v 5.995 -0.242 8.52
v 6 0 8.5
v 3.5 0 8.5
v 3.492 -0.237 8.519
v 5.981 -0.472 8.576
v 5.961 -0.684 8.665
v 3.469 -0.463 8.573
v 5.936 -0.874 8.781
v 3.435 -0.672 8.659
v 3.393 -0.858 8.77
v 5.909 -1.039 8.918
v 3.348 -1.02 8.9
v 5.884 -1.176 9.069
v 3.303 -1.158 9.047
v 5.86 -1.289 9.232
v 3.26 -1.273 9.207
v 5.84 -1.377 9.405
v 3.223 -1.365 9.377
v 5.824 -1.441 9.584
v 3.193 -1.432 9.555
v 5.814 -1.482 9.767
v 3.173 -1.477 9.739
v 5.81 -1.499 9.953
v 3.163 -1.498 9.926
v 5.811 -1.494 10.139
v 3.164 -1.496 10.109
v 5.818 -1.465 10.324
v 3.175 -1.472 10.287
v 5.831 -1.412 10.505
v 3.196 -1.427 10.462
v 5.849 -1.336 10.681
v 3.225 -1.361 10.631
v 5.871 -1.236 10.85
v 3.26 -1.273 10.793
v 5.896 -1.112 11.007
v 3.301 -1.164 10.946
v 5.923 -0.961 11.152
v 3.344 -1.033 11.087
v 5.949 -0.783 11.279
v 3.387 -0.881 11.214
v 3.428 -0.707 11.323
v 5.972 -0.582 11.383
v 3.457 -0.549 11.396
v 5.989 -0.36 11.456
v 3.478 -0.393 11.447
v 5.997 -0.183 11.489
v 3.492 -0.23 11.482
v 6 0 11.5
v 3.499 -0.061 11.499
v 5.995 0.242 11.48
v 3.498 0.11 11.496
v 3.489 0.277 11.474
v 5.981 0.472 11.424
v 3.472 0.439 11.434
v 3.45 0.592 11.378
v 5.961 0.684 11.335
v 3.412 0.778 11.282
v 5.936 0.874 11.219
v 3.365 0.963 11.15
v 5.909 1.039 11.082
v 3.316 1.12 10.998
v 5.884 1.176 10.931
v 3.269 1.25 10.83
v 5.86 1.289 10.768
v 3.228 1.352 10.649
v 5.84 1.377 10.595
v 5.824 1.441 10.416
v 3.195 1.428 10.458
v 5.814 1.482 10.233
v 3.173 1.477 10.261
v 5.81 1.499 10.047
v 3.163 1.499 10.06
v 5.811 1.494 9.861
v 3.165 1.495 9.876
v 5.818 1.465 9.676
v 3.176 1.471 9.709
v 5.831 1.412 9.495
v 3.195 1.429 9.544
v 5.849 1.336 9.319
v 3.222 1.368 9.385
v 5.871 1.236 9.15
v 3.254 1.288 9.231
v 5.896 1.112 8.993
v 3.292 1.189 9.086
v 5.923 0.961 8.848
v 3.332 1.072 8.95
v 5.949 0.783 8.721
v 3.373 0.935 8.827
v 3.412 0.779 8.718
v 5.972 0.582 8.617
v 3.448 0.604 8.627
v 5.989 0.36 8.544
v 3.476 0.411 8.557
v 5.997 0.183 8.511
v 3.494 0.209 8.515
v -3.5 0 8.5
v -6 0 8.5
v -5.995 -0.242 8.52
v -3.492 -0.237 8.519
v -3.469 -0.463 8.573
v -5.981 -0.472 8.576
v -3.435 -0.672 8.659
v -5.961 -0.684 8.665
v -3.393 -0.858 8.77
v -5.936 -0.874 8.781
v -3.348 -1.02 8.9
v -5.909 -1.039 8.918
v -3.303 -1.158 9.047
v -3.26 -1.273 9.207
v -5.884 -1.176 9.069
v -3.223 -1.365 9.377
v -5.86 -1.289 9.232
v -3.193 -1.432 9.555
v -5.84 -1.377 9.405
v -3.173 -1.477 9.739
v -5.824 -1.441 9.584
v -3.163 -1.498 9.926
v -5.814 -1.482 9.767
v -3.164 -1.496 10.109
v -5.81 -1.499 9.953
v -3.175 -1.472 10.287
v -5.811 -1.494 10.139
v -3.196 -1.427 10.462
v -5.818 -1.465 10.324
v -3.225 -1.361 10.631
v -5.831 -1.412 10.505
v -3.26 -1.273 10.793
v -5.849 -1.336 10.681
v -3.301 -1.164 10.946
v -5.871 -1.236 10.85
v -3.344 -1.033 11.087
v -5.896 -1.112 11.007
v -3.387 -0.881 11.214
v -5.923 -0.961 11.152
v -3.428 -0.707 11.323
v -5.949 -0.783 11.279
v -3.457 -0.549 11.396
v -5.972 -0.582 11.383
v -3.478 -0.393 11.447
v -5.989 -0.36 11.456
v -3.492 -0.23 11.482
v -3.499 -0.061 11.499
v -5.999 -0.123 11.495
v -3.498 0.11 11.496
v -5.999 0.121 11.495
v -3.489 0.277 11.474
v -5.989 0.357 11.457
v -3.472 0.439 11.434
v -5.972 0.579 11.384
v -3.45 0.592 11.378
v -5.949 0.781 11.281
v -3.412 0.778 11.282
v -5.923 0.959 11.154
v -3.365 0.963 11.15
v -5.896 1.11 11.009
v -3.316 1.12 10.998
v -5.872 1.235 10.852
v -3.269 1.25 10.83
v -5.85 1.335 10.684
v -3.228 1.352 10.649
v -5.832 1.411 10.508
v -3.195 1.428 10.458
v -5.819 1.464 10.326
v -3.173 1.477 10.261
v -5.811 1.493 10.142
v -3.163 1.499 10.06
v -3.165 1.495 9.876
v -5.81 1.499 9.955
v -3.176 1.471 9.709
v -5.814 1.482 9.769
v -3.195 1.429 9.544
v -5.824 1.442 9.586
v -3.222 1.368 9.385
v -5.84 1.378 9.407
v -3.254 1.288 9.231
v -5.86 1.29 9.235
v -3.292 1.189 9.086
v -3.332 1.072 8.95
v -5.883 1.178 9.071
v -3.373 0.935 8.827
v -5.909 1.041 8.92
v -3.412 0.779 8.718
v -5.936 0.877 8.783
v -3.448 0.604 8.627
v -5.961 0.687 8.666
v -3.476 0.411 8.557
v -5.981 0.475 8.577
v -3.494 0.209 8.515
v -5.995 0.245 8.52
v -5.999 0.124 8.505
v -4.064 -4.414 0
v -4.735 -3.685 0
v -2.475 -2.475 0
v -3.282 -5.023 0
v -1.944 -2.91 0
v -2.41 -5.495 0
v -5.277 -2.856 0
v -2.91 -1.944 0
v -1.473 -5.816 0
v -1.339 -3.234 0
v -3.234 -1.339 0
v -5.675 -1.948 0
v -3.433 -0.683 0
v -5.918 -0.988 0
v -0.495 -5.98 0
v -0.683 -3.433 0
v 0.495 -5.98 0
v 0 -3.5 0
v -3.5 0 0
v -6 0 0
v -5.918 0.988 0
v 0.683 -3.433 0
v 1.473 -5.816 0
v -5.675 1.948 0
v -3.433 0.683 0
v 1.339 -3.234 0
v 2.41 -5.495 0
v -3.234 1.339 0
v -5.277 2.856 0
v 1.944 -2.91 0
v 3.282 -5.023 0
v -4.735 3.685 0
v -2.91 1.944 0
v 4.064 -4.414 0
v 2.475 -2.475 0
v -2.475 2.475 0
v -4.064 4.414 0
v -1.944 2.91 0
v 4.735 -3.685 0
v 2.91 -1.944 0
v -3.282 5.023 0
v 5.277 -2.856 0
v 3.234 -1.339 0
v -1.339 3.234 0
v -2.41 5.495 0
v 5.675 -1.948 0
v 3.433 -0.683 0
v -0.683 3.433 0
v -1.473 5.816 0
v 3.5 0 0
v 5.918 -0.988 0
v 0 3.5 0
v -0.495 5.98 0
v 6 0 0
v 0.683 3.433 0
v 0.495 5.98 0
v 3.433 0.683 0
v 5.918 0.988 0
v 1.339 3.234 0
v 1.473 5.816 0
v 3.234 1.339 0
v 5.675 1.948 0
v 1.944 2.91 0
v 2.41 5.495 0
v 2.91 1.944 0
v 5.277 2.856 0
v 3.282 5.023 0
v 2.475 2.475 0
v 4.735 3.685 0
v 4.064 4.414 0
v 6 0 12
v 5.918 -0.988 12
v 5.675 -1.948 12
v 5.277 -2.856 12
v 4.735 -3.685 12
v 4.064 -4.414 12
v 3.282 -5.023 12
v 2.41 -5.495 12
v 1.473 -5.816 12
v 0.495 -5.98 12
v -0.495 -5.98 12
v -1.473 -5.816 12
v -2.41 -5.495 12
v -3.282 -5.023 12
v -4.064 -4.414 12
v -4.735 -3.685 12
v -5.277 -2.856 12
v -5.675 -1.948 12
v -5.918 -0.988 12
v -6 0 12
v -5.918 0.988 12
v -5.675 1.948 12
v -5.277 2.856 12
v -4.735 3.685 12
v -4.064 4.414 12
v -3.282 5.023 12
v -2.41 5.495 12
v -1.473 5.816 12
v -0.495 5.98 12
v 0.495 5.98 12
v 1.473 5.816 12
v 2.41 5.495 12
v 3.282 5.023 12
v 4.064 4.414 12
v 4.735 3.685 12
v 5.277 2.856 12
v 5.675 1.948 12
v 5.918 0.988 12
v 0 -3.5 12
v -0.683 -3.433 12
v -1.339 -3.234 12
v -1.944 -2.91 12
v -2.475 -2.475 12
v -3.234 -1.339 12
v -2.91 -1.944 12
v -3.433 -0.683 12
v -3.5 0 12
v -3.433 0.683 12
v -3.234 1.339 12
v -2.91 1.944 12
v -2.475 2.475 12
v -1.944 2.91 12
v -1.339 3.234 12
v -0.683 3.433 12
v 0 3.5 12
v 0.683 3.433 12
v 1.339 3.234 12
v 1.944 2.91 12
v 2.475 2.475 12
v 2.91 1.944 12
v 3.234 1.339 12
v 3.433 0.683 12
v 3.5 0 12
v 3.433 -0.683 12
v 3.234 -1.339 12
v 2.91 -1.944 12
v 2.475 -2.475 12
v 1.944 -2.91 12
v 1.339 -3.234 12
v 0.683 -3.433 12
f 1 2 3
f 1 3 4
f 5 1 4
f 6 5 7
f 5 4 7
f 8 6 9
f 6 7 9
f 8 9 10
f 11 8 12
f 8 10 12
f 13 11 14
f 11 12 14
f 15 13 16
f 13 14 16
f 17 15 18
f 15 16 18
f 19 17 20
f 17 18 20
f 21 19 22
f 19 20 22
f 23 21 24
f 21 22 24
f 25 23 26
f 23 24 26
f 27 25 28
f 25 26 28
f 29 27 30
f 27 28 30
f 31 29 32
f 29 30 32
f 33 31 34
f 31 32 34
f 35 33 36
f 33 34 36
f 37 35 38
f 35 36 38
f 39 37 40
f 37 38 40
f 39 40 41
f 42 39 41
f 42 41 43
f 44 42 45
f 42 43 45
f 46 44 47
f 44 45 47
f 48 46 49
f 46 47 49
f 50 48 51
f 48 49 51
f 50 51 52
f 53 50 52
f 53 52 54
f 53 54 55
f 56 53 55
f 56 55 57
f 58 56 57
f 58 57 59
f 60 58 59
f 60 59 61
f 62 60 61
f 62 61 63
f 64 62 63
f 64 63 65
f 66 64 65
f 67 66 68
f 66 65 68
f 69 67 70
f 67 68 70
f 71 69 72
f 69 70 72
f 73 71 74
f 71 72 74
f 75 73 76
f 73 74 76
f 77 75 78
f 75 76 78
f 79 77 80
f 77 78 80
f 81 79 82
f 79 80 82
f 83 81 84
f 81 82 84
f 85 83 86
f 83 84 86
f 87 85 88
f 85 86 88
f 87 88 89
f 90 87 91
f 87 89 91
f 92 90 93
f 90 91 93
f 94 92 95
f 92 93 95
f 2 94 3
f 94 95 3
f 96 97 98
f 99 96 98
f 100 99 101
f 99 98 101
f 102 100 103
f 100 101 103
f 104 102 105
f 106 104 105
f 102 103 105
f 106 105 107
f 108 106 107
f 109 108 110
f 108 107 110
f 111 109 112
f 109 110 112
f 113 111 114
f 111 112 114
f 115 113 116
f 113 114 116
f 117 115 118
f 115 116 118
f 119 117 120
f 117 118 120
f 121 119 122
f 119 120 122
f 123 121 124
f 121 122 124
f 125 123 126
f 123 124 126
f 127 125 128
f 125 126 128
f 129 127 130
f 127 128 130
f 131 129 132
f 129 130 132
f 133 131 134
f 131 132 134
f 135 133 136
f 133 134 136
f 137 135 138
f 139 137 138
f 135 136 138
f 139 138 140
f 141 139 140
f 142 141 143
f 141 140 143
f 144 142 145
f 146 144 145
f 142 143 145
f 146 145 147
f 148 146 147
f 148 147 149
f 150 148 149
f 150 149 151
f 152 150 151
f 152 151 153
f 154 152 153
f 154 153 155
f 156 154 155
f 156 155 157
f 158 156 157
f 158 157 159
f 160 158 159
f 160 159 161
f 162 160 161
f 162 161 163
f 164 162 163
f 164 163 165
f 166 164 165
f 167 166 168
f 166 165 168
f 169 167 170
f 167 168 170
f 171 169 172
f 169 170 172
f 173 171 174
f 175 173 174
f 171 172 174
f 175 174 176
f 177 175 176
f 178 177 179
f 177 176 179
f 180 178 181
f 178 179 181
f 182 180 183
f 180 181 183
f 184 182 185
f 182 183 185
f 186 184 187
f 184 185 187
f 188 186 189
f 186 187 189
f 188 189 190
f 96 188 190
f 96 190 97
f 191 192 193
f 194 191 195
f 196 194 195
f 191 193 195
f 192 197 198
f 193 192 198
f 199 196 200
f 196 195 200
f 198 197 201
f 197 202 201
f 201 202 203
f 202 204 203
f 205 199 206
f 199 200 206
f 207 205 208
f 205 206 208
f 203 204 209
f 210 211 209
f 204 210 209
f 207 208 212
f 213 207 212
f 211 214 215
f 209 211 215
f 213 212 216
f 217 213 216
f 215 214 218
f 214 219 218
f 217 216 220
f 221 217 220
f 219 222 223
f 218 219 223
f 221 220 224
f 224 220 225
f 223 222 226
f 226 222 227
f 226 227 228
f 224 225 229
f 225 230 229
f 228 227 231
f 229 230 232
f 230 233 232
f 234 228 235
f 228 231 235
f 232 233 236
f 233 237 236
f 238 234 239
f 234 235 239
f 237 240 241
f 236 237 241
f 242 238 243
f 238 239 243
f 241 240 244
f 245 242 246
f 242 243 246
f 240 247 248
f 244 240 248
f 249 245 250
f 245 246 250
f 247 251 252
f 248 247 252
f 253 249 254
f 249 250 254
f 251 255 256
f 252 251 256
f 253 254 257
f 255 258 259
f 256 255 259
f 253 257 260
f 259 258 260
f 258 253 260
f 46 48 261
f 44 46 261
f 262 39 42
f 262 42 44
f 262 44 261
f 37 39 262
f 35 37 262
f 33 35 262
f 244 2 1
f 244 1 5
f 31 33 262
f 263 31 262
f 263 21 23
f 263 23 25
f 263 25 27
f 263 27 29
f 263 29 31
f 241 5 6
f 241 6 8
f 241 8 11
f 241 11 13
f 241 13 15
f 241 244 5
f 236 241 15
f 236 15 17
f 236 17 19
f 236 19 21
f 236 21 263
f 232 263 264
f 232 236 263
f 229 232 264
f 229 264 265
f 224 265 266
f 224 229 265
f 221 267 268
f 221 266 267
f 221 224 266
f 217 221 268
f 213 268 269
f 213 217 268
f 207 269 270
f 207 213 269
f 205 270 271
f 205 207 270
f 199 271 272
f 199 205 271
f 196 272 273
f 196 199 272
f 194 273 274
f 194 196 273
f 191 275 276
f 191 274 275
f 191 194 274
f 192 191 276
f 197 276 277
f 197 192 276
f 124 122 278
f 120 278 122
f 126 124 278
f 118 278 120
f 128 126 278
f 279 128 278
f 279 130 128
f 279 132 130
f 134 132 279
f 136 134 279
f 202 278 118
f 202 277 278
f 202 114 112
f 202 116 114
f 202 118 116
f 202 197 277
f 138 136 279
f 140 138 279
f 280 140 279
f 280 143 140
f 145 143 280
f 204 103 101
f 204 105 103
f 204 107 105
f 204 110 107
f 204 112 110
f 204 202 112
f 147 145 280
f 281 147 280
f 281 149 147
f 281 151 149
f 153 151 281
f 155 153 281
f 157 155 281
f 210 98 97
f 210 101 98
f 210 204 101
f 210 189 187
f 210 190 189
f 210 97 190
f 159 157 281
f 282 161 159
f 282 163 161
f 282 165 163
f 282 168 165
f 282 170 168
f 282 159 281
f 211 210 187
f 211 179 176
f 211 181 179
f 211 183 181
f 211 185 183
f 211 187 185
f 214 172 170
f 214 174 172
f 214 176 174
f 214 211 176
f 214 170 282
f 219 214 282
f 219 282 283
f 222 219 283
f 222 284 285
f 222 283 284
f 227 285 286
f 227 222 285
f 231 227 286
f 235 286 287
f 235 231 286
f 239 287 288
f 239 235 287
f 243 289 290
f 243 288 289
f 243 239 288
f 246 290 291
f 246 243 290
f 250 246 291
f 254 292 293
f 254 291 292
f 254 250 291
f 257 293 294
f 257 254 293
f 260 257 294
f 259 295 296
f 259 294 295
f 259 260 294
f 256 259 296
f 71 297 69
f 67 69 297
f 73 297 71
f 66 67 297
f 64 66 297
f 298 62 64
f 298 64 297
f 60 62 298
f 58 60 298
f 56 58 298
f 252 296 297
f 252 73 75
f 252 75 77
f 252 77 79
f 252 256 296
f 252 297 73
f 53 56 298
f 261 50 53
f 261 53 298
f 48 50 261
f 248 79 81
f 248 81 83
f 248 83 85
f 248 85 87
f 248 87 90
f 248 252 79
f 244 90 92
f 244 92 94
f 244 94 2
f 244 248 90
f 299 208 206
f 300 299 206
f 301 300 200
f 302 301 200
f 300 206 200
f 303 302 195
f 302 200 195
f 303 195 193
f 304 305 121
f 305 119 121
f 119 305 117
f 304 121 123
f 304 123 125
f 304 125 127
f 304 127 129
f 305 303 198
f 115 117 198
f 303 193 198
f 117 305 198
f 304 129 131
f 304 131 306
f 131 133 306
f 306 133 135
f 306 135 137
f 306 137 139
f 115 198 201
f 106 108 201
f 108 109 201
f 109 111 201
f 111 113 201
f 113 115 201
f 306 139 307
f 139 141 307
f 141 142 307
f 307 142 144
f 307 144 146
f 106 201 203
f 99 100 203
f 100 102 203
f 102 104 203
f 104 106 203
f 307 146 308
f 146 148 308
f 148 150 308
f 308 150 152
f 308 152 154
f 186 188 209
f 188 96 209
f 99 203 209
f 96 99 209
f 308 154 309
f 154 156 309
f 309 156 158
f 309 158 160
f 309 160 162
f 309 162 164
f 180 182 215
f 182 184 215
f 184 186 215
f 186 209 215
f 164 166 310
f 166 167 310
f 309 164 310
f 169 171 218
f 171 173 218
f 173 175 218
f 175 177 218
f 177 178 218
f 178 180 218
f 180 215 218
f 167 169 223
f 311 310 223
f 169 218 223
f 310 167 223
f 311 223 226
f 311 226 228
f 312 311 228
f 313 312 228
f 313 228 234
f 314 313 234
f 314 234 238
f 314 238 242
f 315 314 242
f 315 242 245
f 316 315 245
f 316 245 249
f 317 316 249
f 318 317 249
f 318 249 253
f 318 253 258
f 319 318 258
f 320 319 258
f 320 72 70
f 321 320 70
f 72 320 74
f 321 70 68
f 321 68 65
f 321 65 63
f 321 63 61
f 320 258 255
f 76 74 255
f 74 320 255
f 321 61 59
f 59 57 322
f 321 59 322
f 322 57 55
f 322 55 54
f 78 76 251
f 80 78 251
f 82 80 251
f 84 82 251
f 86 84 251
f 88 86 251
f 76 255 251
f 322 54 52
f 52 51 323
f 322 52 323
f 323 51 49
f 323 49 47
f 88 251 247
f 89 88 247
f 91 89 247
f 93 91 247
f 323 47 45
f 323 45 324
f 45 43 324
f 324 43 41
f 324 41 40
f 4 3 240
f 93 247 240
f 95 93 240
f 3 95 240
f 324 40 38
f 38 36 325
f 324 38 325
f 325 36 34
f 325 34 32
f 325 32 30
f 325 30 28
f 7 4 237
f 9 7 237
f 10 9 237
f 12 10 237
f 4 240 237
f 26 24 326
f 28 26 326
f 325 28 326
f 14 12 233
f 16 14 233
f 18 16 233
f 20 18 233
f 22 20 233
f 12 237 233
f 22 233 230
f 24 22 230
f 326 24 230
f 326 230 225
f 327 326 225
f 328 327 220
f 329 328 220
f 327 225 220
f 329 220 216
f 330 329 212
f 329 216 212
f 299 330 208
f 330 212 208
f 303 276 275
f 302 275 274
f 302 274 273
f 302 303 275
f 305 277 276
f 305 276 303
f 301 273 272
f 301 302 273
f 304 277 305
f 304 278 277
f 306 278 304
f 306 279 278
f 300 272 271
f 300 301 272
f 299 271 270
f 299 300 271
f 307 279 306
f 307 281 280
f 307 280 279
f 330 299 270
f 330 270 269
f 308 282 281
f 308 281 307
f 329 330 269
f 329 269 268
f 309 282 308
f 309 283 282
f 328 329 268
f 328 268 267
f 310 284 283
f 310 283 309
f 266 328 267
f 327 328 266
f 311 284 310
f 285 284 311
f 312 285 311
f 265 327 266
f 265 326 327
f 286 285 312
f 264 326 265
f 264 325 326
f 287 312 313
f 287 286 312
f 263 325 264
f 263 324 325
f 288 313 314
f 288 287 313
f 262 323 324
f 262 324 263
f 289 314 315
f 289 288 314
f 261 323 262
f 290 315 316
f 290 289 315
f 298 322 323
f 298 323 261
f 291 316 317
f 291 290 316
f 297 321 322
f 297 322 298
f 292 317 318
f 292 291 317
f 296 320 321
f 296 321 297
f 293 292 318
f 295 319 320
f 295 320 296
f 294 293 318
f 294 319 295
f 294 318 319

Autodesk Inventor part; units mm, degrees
ref_plane "XZ Plane" through (0, 0, 0) normal (0, 1, 0) x (-1, 0, 0)
ref_plane "XY Plane" through (0, 0, 0) normal (0, 0, 1) x (1, 0, 0)
sketch "Sketch1" plane through (0, 0, 0) normal (0, 0, 1) x (1, 0, 0)
  circle A0 centre (0, 0) radius 6
  dimension "d0" = 12
extrude "Extrusion1" add sketch "Sketch1" along normal blind 12
thread "Thread1" size "M12x1.75" class "6g" standard "ISO Metric profile" full length
ref_plane "Work Plane1" through (6, 0, 0) normal (1, 0, 0) x (0, 1, 0)
sketch "Sketch3" plane through (6, 0, 0) normal (1, 0, 0) x (0, 1, 0)
  line L0 (6, 12) -> (-6, 12) projected
  point P0 (0, 0)
  point P1 (0, 10)
  dimension "d13" = 2
hole "Hole2" at (6, 0, 10) direction (-1, 0, 0) diameter 3 end through all
sketch "Sketch2" plane through (0, 0, 12) normal (0, 0, 1) x (1, 0, 0)
  circle A0 centre (0, 0) radius 6 projected
hole "Hole1" at (0, 0, 12) direction (0, 0, -1) diameter 7 depth 12
properties part number "38" material "Copper"
